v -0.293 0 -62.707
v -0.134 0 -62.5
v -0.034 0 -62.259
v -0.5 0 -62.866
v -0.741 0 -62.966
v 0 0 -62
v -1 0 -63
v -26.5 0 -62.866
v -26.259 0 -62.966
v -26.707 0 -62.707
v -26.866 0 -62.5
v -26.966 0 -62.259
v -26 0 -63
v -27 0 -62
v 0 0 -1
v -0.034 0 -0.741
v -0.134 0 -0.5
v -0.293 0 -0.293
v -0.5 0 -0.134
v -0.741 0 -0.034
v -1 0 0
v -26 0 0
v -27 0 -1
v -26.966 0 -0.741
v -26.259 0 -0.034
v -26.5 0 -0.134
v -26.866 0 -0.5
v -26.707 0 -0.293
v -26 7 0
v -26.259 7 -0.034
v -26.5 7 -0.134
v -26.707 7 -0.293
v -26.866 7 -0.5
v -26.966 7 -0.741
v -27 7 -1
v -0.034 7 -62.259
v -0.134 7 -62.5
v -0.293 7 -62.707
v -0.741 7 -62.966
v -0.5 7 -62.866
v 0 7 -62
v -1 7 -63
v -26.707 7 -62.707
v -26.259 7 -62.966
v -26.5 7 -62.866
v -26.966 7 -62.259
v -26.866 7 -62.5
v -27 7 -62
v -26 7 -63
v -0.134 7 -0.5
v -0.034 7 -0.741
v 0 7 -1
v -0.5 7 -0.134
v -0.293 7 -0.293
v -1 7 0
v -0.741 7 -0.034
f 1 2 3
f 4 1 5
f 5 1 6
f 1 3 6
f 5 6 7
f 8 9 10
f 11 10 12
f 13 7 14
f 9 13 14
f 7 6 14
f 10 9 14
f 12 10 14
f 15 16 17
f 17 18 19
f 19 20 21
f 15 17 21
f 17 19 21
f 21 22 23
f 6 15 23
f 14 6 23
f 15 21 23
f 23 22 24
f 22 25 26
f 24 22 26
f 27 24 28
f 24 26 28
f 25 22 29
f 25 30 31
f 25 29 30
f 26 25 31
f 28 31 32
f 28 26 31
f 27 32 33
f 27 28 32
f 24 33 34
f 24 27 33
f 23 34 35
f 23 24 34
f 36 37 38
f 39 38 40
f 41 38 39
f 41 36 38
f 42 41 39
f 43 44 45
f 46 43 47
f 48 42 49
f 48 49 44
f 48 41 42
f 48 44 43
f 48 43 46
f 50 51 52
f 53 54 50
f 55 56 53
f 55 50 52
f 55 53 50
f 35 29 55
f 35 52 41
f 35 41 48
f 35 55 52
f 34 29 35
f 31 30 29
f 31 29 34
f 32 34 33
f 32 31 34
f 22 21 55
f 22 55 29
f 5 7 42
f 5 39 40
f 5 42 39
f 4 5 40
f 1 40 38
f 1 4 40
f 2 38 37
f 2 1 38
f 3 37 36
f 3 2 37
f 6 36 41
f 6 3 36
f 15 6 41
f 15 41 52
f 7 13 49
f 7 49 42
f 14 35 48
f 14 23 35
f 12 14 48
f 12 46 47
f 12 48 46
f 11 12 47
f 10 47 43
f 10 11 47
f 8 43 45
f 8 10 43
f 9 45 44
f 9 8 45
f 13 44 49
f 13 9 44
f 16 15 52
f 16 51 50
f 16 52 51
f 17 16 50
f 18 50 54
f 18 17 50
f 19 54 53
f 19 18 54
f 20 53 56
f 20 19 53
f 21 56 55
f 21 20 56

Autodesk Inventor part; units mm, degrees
ref_plane "YZ Plane" through (0, 0, 0) normal (1, 0, 0) x (0, 1, 0)
ref_plane "XZ Plane" through (0, 0, 0) normal (0, 1, 0) x (-1, 0, 0)
ref_plane "XY Plane" through (0, 0, 0) normal (0, 0, 1) x (1, 0, 0)
sketch "Boceto1" plane through (0, 0, 0) normal (0, 1, 0) x (-1, 0, 0)
  line L0 (1, 0) -> (26, 0)
  line L1 (27, -1) -> (27, -62)
  line L2 (26, -63) -> (1, -63)
  line L3 (0, -62) -> (0, -1)
  arc A0 (26, -63) -> (27, -62) centre (26, -62) ccw
  arc A1 (27, -1) -> (26, 0) centre (26, -1) ccw
  arc A2 (1, 0) -> (0, -1) centre (1, -1) ccw
  arc A3 (0, -62) -> (1, -63) centre (1, -62) ccw
  point P0 (0, 0)
  point P1 (27, -63)
  point P2 (27, 0)
  point P3 (0, -63)
  dimension "d0" = 63
  dimension "d1" = 27
  dimension "d2" = 1
extrude "Extrusión1" add sketch "Boceto1" along normal blind 7
sketch "Boceto2" plane through (0, 7, 0) normal (0, 1, 0) x (1, 0, 0)
  line L0 (-27, 62) -> (-27, 1) projected
  line L1 (-27, 62) -> (-27, 63.4862)
  line L2 (-25.9515, 63.0037) -> (-27.3185, 63.0037)
  line L3 (-27, 63.0037) -> (-22, 63)
  line L4 (-1, 63) -> (-26, 63) projected
  line L5 (-22, 63) -> (-22, 58)
  circle A0 centre (-22, 58) radius 1.5
  point P0 (0, 0)
  dimension "d5" = 5
  dimension "d7" = 5
  dimension "d8" = 3
sketch "Boceto3" plane through (0, 0, 0) normal (0, -1, 0) x (1, 0, 0)
  arc A0 (-27, -62) -> (-26, -63) centre (-26, -62) ccw projected
  line L0 (-26, -63) -> (-27.2127, -63)
  line L1 (-27, -62) -> (-27, -1) projected
  line L2 (-27, -61.713) -> (-27, -63.5495)
  line L3 (-27, -63) -> (-27, -58)
  line L4 (-27, -58) -> (-22, -58)
  circle A1 centre (-22, -58) radius 1.5
  point P0 (0, 0)
  dimension "d9" = 5
  dimension "d10" = 5
  dimension "d11" = 3
properties part number "Controlador 1"
